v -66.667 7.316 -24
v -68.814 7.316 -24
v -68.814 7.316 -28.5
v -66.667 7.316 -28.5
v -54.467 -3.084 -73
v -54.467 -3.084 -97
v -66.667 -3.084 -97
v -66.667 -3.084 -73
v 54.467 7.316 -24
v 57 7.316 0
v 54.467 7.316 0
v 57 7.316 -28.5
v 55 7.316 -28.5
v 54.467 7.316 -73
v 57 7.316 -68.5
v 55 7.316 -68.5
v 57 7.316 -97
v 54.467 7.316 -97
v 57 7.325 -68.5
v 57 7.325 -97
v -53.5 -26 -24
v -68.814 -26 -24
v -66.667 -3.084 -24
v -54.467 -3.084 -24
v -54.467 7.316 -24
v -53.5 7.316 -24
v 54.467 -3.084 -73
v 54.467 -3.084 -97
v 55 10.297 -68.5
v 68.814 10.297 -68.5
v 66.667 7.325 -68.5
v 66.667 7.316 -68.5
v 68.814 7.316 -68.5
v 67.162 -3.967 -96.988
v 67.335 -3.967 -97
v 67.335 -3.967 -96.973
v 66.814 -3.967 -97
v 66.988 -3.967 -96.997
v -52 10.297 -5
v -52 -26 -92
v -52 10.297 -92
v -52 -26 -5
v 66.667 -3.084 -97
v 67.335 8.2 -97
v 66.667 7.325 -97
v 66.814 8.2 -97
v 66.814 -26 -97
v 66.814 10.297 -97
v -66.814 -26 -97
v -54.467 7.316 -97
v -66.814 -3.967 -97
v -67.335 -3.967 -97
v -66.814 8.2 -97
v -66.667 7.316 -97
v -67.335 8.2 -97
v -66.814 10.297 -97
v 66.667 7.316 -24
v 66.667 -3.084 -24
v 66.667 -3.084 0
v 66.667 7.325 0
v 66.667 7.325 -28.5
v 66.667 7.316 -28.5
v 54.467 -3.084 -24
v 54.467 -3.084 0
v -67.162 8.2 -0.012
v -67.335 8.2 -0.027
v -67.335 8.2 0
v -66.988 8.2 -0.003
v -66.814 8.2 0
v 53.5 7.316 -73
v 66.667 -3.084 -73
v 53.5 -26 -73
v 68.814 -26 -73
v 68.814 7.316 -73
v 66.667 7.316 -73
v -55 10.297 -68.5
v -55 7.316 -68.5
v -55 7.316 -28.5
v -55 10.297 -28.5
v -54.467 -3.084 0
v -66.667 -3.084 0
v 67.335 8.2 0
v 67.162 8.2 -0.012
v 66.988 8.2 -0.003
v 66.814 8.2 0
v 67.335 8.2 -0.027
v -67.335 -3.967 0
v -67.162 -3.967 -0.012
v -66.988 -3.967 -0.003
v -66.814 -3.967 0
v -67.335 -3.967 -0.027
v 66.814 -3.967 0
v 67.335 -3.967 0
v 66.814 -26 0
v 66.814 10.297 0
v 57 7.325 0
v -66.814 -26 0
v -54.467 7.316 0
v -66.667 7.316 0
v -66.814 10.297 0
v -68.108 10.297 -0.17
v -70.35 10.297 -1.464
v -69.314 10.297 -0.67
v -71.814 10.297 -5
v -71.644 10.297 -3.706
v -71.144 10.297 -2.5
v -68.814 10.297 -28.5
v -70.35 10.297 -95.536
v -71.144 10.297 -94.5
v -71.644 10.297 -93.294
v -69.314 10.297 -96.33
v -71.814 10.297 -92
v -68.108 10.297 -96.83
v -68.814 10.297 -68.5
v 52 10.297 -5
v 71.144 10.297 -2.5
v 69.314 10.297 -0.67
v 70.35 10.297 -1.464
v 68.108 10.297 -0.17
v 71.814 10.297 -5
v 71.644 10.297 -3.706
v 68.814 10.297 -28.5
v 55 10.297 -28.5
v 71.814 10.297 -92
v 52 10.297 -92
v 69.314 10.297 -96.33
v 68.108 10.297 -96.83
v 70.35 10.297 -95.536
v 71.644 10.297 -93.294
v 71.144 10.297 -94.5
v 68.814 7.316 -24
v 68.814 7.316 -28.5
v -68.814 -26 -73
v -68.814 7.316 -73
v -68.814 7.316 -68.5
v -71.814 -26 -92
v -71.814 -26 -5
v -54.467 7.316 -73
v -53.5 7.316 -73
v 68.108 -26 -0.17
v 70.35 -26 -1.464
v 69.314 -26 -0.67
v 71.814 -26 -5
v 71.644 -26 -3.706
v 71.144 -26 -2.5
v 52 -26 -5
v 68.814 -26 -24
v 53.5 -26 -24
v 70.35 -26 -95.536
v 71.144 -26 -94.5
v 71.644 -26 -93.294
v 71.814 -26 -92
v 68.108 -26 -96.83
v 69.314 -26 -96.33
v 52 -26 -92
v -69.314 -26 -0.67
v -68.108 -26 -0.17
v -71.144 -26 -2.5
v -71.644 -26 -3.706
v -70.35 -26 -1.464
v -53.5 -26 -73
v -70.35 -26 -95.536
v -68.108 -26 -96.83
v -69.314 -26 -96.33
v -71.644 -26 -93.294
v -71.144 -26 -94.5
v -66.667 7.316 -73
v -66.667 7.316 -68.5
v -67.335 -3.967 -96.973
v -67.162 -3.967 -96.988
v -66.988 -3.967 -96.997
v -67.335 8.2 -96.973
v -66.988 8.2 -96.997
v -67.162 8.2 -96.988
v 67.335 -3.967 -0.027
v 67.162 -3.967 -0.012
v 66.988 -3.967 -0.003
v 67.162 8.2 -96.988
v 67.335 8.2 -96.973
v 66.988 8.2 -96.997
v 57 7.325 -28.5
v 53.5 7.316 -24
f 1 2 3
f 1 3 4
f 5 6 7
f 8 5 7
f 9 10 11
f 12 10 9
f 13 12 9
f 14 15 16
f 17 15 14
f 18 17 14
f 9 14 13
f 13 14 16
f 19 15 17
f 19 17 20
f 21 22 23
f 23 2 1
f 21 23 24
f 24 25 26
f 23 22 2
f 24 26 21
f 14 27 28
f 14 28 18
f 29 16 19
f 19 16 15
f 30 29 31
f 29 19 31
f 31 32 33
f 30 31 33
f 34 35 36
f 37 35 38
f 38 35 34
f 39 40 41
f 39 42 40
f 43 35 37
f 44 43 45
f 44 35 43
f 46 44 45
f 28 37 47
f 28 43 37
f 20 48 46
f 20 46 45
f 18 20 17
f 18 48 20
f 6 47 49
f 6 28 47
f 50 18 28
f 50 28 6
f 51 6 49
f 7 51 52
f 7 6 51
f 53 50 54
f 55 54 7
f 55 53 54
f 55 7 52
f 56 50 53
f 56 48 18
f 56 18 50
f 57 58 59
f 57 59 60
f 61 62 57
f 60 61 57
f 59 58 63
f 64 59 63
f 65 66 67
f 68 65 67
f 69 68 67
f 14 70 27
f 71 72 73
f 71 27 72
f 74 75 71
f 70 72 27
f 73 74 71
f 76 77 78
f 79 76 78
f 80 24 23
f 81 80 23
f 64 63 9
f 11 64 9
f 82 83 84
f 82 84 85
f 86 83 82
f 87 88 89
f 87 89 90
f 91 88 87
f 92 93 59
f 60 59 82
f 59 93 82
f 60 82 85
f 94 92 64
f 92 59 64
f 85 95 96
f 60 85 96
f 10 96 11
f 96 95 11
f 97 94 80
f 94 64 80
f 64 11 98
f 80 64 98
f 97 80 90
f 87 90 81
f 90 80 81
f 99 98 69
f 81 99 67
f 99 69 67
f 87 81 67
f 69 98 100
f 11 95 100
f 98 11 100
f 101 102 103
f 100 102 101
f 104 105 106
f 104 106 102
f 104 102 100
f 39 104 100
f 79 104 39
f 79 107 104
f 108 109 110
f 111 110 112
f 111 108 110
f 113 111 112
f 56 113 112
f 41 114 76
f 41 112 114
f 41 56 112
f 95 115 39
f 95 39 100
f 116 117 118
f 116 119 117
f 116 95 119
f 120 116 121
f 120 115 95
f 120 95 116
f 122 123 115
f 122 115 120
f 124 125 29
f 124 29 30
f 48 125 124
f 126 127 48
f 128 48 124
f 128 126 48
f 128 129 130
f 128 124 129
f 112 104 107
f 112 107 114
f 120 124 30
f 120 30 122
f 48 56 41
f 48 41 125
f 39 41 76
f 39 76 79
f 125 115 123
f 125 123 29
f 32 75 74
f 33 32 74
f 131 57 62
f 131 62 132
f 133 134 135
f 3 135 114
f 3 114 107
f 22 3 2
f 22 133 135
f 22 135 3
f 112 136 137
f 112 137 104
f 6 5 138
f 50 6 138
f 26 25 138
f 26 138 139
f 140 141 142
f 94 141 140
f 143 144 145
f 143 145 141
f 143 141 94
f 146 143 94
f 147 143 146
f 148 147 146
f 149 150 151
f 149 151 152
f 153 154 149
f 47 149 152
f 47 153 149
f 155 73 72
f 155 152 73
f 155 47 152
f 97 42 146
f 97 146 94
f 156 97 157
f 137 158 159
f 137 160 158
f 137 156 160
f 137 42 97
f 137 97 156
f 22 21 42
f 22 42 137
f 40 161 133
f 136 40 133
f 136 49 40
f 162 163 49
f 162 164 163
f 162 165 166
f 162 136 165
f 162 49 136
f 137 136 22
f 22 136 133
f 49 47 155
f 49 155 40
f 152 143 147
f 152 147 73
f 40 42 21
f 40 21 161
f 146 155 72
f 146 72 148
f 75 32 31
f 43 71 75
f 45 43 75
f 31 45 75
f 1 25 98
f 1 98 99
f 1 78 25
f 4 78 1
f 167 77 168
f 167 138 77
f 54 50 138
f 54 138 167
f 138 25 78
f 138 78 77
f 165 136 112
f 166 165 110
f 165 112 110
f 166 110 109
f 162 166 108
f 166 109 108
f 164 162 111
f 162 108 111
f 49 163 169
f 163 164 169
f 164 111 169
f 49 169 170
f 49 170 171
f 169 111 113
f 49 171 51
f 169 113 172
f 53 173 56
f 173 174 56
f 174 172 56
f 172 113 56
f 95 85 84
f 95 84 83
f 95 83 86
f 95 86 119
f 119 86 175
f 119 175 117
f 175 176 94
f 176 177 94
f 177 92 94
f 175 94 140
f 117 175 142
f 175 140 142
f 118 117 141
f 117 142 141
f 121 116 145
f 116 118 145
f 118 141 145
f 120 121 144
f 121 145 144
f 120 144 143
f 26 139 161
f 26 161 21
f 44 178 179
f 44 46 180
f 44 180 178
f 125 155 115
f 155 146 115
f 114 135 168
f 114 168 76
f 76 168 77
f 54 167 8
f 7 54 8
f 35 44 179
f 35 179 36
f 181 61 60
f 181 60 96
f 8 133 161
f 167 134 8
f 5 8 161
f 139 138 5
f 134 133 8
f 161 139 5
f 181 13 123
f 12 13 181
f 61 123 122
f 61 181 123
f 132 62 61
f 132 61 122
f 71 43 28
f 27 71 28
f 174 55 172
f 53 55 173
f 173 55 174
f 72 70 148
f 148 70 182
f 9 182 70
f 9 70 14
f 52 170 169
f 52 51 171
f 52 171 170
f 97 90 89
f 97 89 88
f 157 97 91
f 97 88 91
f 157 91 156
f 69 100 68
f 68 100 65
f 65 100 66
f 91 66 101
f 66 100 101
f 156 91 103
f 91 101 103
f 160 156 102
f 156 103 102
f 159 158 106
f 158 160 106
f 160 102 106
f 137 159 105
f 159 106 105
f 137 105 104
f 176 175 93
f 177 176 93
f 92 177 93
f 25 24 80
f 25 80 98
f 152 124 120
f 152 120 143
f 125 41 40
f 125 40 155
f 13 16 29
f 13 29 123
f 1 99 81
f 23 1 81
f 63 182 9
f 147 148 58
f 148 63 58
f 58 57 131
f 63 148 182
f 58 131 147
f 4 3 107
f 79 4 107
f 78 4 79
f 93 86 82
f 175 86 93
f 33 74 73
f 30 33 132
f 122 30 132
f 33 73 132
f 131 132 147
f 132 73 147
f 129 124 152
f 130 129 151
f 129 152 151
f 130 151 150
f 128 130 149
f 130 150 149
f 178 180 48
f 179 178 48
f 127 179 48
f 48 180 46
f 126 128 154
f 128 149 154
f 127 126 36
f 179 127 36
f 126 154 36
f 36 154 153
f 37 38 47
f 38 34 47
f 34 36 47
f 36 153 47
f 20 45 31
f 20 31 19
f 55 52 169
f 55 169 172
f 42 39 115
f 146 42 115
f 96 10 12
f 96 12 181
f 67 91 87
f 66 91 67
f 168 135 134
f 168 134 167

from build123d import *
from build123d.topology import SkipClean

# Parameters (mm, degrees)
CROQUIS1_W              = 114
CROQUIS1_H              = 34.2
SALIENTE_EXTRUIR1_DEPTH = 97
VACIADO1_T              = -5
SALIENTE_EXTRUIR2_DEPTH = 97
CORTAR_EXTRUIR1_REACH   = 128.031
CROQUIS3_W              = 13.814275766
CROQUIS3_H              = 40
REDONDEO2_R             = 5
CROQUIS6_W              = 12.3
CROQUIS6_H              = 10.4
CORTAR_EXTRUIR3_DEPTH   = 124.459670354
SALIENTE_EXTRUIR3_DEPTH = 97
CROQUIS8_W              = 13.814275766
CROQUIS8_H              = 40
CORTAR_EXTRUIR4_DEPTH   = 127.030661617
CROQUIS9_W              = 104
CROQUIS9_H              = 87
CORTAR_EXTRUIR5_DEPTH   = 10
CORTAR_EXTRUIR6_START   = -33.316303
CROQUIS11_W             = 1.5
CROQUIS11_H             = 39.999512223
CROQUIS11_H_2           = 40
CORTAR_EXTRUIR6_DEPTH   = 33.316303
CORTAR_EXTRUIR7_START   = -33.316303
CROQUIS13_W             = 15.314275766
CROQUIS13_H             = 4.5
CORTAR_EXTRUIR7_DEPTH   = 33.316303


with BuildPart() as part:
    # Croquis1 → Saliente-Extruir1 (new body)
    with BuildSketch(Plane.XY):
        with Locations((0, -8.9)):
            Rectangle(CROQUIS1_W, CROQUIS1_H)
    extrude(amount=-SALIENTE_EXTRUIR1_DEPTH)

    # Vaciado1
    vaciado1_openings = [part.faces().sort_by_distance(p)[0] for p in [
        (0, -26, -48.5),
    ]]
    offset(amount=VACIADO1_T, openings=vaciado1_openings, kind=Kind.INTERSECTION)

    # Croquis2 → Saliente-Extruir2 (add, through all)
    with BuildSketch(Plane(origin=(0, 0, -97), x_dir=(-1, 0, 0), z_dir=(0, 0, -1))):
        Polygon((71.814275766, 8.2), (67.33466189, 8.2), (67.33466189, -3.967393508), (57, -3.967393508), (57, -26), (67.33466189, -26), (71.814275766, -26), align=None)
        Polygon((-57, 8.2), (57, 8.2), (67.33466189, 8.2), (71.814275766, 8.2), (71.814275766, 10.296521374), (-71.814275766, 10.296521374), (-71.814275766, 8.2), (-67.33466189, 8.2), align=None)
        Polygon((-67.33466189, -3.967393508), (-67.33466189, 8.2), (-71.814275766, 8.2), (-71.814275766, -26), (-67.33466189, -26), (-57, -26), (-57, -3.967393508), align=None)
    extrude(amount=-SALIENTE_EXTRUIR2_DEPTH)

    # Croquis3 → Cortar-Extruir1 (cut, up to next)
    with BuildSketch(Plane.XZ.offset(26), mode=Mode.PRIVATE) as cortar_extruir1_sk1:
        with Locations((-61.907137883, -48.5)):
            Rectangle(CROQUIS3_W, CROQUIS3_H)
    cortar_extruir1_tool1 = extrude(cortar_extruir1_sk1.sketch, amount=-CORTAR_EXTRUIR1_REACH, mode=Mode.PRIVATE) & part.part
    # Croquis3 → Cortar-Extruir1 (cut, up to next)
    with BuildSketch(Plane.XZ.offset(26), mode=Mode.PRIVATE) as cortar_extruir1_sk2:
        with Locations((61.907137883, -48.5)):
            Rectangle(CROQUIS3_W, CROQUIS3_H)
    cortar_extruir1_tool2 = extrude(cortar_extruir1_sk2.sketch, amount=-CORTAR_EXTRUIR1_REACH, mode=Mode.PRIVATE) & part.part
    add(cortar_extruir1_tool1.solids().sort_by_distance((-61.907138, -26, -48.5))[0], mode=Mode.SUBTRACT)
    add(cortar_extruir1_tool2.solids().sort_by_distance((61.907138, -26, -48.5))[0], mode=Mode.SUBTRACT)

    # Redondeo2
    # the kernel refuses this fillet: 5 mm, written as the material it takes off along each edge
    with BuildSketch(Plane(origin=(71.814275766, -38.5, -97), x_dir=(0, 0, 1), z_dir=(0, 1, 0)), Plane(origin=(71.814275766, -38.5, 0), x_dir=(-1, 0, 0), z_dir=(0, 1, 0)), Plane(origin=(-71.814275766, 22.796521374, -97), x_dir=(0, 0, 1), z_dir=(0, -1, 0)), Plane(origin=(-71.814275766, 22.796521374, 0), x_dir=(1, 0, 0), z_dir=(0, -1, 0))) as redondeo2_piece_1:
        with BuildLine():
            CenterArc((REDONDEO2_R, -REDONDEO2_R), REDONDEO2_R, 90, 90)
            Line((0, -REDONDEO2_R), (0, 0))
            Line((0, 0), (REDONDEO2_R, 0))
        make_face()
    extrude(amount=61.296521374, mode=Mode.SUBTRACT)

    # Croquis6 → Cortar-Extruir3 (cut, through all)
    with BuildSketch(Plane(origin=(0, 0, -97), x_dir=(-1, 0, 0), z_dir=(0, 0, -1))):
        with Locations((-60.617330945, 2.116303246)):
            Rectangle(CROQUIS6_W, CROQUIS6_H)
        with Locations((60.617330945, 2.116303246)):
            Rectangle(CROQUIS6_W, CROQUIS6_H)
    extrude(amount=-CORTAR_EXTRUIR3_DEPTH, mode=Mode.SUBTRACT)

    # Croquis7 → Saliente-Extruir3 (add, through all)
    with BuildSketch(Plane(origin=(0, 0, -97), x_dir=(-1, 0, 0), z_dir=(0, 0, -1))):
        Polygon((57, 8.2), (57, 7.316303246), (66.667330945, 7.316303246), (66.667330945, -3.083696754), (57, -3.083696754), (57, -3.967393508), (66.814275766, -3.967393508), (67.33466189, -3.967393508), (67.33466189, 8.2), (66.814275766, 8.2), align=None)
        Polygon((-66.667330945, 7.32503221), (-57, 7.32503221), (-57, 8.2), (-66.814275766, 8.2), (-67.33466189, 8.2), (-67.33466189, -3.967393508), (-66.814275766, -3.967393508), (-57, -3.967393508), (-57, -3.083696754), (-66.667330945, -3.083696754), align=None)
    extrude(amount=-SALIENTE_EXTRUIR3_DEPTH)

    # Croquis8 → Cortar-Extruir4 (cut, through all)
    with BuildSketch(Plane(origin=(0, 10.296521374, 0), x_dir=(1, 0, 0), z_dir=(0, 1, 0))):
        with Locations((-61.907137883, 48.5)):
            Rectangle(CROQUIS8_W, CROQUIS8_H)
        with Locations((61.907137883, 48.5)):
            Rectangle(CROQUIS8_W, CROQUIS8_H)
    extrude(amount=-CORTAR_EXTRUIR4_DEPTH, mode=Mode.SUBTRACT)

    # Croquis9 → Cortar-Extruir5 (cut)
    with BuildSketch(Plane.XZ.offset(-3.2)):
        with Locations((0, -48.5)):
            Rectangle(CROQUIS9_W, CROQUIS9_H)
    extrude(amount=-CORTAR_EXTRUIR5_DEPTH, mode=Mode.SUBTRACT)

    # Croquis11 → Cortar-Extruir6 (cut)
    with SkipClean():  # the faces are left unmerged after this step: merging them gives an invalid solid
        with BuildSketch(Plane.XZ.offset(26).offset(CORTAR_EXTRUIR6_START)):
            with Locations((54.25, -48.499756112)):
                Rectangle(CROQUIS11_W, CROQUIS11_H)
            with Locations((-54.25, -48.5)):
                Rectangle(CROQUIS11_W, CROQUIS11_H_2)
        extrude(amount=CORTAR_EXTRUIR6_DEPTH, mode=Mode.SUBTRACT)

    # Croquis13 → Cortar-Extruir7 (cut)
    with BuildSketch(Plane.XZ.offset(26).offset(CORTAR_EXTRUIR7_START)):
        with Locations((-61.157137883, -26.25)):
            Rectangle(CROQUIS13_W, CROQUIS13_H)
        with Locations((-61.157137883, -70.75)):
            Rectangle(CROQUIS13_W, CROQUIS13_H)
        with Locations((61.157137883, -26.25)):
            Rectangle(CROQUIS13_W, CROQUIS13_H)
        with Locations((61.157137883, -70.749512223)):
            Rectangle(CROQUIS13_W, CROQUIS13_H)
    extrude(amount=CORTAR_EXTRUIR7_DEPTH, mode=Mode.SUBTRACT)


solid = part.part
